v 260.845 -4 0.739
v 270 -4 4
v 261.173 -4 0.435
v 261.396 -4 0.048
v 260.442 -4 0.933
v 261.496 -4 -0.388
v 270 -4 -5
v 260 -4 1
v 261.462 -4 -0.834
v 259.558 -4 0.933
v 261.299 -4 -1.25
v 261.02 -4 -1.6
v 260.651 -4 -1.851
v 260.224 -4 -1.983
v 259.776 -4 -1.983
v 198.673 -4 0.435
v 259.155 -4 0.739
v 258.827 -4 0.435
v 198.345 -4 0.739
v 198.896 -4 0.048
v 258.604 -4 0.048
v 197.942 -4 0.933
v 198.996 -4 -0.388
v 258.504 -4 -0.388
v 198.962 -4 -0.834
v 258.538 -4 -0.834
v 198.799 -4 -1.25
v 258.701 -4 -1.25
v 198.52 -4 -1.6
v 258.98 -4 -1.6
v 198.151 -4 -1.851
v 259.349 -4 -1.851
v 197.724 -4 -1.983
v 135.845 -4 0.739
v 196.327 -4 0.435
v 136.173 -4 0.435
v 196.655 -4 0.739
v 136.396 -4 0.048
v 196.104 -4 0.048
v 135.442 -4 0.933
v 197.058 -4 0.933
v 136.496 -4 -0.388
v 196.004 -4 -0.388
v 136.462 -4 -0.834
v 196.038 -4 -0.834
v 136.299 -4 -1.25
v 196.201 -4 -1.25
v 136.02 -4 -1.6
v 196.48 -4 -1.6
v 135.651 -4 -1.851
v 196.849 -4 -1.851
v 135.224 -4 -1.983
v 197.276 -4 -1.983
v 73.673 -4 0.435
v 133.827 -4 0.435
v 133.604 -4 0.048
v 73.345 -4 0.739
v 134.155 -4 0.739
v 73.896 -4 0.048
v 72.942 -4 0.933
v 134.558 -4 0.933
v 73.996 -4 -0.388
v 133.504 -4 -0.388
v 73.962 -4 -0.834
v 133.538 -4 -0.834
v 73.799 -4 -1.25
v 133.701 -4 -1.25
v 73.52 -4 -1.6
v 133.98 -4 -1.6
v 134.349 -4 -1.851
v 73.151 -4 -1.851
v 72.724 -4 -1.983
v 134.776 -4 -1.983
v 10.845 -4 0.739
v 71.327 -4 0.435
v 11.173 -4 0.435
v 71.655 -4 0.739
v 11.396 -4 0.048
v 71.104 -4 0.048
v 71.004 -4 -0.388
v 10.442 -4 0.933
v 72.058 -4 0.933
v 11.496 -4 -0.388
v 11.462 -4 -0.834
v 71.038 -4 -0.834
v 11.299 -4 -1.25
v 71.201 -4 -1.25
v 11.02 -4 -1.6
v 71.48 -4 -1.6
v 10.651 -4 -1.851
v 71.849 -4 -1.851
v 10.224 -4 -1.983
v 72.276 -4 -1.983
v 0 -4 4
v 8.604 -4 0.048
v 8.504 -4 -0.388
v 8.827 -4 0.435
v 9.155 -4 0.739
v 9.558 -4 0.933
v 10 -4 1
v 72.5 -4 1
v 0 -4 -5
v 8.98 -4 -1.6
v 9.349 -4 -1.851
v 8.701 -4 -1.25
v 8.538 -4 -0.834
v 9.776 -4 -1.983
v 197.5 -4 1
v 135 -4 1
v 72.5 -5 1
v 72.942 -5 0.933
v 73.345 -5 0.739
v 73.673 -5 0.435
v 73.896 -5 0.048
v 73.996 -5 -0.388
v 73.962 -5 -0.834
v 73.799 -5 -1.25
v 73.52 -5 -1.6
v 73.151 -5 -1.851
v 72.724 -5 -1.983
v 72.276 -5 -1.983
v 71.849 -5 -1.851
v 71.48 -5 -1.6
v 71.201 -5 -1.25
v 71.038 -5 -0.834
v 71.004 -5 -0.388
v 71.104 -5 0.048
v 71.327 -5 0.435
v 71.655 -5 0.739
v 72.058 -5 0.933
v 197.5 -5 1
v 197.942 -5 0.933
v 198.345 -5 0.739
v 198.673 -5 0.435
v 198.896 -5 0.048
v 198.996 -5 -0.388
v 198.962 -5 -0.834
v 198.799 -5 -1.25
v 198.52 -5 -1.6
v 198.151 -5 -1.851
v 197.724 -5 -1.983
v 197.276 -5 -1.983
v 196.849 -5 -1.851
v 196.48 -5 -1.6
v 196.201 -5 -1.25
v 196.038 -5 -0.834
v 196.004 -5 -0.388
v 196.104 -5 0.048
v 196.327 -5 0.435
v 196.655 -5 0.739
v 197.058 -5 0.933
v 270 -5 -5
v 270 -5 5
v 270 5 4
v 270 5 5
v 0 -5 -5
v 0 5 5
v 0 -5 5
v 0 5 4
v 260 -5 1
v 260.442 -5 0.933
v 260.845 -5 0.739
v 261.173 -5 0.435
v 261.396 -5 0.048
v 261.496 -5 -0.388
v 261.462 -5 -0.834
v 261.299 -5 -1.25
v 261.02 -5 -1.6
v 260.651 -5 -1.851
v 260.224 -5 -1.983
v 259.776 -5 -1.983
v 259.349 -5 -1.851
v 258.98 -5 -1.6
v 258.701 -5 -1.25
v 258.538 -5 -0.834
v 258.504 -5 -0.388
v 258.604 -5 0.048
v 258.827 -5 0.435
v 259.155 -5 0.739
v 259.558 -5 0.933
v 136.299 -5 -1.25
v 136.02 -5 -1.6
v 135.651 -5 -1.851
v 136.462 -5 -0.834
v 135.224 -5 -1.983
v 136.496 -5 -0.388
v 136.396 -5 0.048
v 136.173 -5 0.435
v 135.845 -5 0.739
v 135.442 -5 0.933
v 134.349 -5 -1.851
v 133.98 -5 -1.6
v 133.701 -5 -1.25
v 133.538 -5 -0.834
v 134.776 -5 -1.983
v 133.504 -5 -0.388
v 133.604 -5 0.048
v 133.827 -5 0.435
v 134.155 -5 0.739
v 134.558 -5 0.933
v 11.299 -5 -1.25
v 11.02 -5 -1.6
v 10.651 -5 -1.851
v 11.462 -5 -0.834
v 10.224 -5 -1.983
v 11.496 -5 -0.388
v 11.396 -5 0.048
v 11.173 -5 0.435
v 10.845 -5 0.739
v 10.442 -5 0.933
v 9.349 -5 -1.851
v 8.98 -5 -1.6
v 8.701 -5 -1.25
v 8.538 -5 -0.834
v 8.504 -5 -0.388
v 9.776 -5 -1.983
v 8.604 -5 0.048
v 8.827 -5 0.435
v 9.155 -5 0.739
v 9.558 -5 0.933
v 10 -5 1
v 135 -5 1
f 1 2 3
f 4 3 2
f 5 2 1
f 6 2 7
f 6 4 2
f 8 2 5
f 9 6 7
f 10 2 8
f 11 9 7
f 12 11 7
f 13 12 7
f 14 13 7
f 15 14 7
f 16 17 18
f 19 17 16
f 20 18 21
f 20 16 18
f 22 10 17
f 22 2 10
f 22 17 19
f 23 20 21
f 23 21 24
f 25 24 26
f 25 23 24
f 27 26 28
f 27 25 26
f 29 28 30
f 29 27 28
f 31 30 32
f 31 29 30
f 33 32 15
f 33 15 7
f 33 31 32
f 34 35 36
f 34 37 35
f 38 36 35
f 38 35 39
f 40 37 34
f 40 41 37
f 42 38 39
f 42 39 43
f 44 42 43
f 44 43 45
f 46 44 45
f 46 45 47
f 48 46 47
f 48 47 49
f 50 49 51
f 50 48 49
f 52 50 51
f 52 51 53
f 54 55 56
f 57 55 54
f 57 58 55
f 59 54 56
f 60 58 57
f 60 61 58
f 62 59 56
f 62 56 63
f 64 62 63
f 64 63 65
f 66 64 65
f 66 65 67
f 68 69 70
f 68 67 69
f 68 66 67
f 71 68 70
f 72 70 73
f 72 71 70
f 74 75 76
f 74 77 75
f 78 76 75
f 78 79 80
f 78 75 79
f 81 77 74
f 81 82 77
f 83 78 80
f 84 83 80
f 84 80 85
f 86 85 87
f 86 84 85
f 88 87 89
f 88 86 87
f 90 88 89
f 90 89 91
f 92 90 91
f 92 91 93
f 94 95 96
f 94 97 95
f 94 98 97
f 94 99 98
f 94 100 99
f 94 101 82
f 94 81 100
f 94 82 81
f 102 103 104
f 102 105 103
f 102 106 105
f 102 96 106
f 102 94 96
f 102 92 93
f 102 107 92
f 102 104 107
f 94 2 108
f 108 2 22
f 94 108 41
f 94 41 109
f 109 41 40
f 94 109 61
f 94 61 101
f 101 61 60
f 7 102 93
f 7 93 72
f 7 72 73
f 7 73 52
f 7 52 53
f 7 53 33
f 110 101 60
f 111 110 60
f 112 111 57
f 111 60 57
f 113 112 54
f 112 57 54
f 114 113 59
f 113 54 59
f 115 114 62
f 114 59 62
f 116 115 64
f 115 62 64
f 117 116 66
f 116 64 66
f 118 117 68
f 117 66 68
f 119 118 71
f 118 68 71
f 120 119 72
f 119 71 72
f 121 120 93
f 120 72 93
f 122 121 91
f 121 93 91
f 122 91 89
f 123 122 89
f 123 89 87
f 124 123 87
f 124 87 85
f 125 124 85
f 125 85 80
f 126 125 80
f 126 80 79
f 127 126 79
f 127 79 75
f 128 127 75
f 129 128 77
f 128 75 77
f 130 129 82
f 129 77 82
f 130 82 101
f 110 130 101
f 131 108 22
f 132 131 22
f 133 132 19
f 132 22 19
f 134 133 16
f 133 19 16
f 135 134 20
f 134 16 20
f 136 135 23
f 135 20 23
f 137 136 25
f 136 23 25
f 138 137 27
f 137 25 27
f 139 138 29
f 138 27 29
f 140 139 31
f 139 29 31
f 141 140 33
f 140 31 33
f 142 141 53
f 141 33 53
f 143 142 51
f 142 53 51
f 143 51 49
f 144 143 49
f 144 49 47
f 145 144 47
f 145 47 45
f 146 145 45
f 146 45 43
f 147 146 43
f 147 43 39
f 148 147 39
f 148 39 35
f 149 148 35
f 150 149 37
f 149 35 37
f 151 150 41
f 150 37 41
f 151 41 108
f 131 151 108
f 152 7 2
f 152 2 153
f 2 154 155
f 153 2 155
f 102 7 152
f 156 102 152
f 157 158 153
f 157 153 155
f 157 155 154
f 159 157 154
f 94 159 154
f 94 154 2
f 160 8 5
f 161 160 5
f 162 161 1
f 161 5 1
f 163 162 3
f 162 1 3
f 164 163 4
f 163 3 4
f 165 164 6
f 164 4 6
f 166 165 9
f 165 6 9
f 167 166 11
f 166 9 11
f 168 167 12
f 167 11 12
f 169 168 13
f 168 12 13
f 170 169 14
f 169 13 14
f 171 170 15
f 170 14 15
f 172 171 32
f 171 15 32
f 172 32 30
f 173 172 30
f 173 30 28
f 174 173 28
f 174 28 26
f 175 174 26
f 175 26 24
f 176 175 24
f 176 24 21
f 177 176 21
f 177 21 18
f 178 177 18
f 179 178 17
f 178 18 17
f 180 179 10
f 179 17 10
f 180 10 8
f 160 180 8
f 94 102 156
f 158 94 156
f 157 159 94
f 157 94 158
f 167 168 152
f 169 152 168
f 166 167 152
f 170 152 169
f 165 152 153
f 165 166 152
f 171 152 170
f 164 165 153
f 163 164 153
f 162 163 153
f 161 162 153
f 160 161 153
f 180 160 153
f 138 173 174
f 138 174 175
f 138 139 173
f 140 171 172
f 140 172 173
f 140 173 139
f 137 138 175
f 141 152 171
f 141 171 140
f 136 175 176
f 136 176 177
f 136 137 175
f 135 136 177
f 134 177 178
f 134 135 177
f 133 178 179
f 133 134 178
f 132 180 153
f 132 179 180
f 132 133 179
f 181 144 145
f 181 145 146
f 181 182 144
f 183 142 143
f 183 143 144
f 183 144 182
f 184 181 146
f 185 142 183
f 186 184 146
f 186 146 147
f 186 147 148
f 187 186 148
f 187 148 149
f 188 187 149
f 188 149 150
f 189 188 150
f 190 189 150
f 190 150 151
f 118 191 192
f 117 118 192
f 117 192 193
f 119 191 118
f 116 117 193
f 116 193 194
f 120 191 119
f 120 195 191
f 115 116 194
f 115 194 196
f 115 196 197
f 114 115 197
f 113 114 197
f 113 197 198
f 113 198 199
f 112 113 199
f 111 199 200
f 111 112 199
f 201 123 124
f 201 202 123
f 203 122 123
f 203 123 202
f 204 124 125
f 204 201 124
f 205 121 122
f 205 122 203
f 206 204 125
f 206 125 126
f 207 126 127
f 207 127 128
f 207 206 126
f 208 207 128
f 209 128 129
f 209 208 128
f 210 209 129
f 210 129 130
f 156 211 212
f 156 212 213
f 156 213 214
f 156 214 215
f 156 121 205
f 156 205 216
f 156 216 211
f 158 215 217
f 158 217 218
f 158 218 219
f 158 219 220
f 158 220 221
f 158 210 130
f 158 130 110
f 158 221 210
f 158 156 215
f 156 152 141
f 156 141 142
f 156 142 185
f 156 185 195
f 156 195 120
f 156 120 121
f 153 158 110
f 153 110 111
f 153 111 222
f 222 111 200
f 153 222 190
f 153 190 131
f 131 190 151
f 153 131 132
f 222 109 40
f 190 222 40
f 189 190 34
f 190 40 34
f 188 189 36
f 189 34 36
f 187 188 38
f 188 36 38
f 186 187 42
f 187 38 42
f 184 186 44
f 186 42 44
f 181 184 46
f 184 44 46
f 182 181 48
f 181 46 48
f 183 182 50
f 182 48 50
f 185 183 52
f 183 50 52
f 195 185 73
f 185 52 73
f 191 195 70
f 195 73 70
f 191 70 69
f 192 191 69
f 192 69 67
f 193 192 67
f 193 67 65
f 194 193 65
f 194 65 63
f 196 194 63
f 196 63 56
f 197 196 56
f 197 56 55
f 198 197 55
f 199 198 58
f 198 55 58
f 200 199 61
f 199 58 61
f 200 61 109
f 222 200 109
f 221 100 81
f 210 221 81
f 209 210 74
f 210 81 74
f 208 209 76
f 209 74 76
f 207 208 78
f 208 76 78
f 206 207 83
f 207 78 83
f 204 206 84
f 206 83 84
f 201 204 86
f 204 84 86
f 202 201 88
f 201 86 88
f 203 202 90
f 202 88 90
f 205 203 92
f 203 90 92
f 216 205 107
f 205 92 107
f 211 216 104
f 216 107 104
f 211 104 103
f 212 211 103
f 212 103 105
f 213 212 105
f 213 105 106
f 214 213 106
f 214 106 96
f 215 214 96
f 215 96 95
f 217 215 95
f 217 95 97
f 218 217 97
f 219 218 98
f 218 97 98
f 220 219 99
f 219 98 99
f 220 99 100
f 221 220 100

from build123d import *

# Parameters (mm, degrees)
EXTRUDE_1_DEPTH     = 270
SKETCH_2_R          = 1.5
CUT_EXTRUDE_1_DEPTH = 1


with BuildPart() as part:
    # Эскиз1 → Бобышка-Вытянуть1 (new body)
    with BuildSketch(Plane(origin=(0, 0, 0), x_dir=(0, 0, -1), z_dir=(1, 0, 0))):
        Polygon((-5, 5), (-4, 5), (-4, -4), (5, -4), (5, -5), (-5, -5), align=None)
    extrude(amount=EXTRUDE_1_DEPTH)

    # Эскиз2 → Вырез-Вытянуть1 (cut)
    with BuildSketch(Plane(origin=(0, -4, 0), x_dir=(1, 0, 0), z_dir=(0, 1, 0))):
        with Locations(Location((135, 0.5, 0), (0, 0, 270))):
            Circle(SKETCH_2_R)
        with Locations(Location((72.5, 0.5, 0), (0, 0, 270))):
            Circle(SKETCH_2_R)
        with Locations(Location((10, 0.5, 0), (0, 0, 270))):
            Circle(SKETCH_2_R)
        with Locations(Location((260, 0.5, 0), (0, 0, 270))):
            Circle(SKETCH_2_R)
        with Locations(Location((197.5, 0.5, 0), (0, 0, 270))):
            Circle(SKETCH_2_R)
    extrude(amount=-CUT_EXTRUDE_1_DEPTH, mode=Mode.SUBTRACT)


solid = part.part
